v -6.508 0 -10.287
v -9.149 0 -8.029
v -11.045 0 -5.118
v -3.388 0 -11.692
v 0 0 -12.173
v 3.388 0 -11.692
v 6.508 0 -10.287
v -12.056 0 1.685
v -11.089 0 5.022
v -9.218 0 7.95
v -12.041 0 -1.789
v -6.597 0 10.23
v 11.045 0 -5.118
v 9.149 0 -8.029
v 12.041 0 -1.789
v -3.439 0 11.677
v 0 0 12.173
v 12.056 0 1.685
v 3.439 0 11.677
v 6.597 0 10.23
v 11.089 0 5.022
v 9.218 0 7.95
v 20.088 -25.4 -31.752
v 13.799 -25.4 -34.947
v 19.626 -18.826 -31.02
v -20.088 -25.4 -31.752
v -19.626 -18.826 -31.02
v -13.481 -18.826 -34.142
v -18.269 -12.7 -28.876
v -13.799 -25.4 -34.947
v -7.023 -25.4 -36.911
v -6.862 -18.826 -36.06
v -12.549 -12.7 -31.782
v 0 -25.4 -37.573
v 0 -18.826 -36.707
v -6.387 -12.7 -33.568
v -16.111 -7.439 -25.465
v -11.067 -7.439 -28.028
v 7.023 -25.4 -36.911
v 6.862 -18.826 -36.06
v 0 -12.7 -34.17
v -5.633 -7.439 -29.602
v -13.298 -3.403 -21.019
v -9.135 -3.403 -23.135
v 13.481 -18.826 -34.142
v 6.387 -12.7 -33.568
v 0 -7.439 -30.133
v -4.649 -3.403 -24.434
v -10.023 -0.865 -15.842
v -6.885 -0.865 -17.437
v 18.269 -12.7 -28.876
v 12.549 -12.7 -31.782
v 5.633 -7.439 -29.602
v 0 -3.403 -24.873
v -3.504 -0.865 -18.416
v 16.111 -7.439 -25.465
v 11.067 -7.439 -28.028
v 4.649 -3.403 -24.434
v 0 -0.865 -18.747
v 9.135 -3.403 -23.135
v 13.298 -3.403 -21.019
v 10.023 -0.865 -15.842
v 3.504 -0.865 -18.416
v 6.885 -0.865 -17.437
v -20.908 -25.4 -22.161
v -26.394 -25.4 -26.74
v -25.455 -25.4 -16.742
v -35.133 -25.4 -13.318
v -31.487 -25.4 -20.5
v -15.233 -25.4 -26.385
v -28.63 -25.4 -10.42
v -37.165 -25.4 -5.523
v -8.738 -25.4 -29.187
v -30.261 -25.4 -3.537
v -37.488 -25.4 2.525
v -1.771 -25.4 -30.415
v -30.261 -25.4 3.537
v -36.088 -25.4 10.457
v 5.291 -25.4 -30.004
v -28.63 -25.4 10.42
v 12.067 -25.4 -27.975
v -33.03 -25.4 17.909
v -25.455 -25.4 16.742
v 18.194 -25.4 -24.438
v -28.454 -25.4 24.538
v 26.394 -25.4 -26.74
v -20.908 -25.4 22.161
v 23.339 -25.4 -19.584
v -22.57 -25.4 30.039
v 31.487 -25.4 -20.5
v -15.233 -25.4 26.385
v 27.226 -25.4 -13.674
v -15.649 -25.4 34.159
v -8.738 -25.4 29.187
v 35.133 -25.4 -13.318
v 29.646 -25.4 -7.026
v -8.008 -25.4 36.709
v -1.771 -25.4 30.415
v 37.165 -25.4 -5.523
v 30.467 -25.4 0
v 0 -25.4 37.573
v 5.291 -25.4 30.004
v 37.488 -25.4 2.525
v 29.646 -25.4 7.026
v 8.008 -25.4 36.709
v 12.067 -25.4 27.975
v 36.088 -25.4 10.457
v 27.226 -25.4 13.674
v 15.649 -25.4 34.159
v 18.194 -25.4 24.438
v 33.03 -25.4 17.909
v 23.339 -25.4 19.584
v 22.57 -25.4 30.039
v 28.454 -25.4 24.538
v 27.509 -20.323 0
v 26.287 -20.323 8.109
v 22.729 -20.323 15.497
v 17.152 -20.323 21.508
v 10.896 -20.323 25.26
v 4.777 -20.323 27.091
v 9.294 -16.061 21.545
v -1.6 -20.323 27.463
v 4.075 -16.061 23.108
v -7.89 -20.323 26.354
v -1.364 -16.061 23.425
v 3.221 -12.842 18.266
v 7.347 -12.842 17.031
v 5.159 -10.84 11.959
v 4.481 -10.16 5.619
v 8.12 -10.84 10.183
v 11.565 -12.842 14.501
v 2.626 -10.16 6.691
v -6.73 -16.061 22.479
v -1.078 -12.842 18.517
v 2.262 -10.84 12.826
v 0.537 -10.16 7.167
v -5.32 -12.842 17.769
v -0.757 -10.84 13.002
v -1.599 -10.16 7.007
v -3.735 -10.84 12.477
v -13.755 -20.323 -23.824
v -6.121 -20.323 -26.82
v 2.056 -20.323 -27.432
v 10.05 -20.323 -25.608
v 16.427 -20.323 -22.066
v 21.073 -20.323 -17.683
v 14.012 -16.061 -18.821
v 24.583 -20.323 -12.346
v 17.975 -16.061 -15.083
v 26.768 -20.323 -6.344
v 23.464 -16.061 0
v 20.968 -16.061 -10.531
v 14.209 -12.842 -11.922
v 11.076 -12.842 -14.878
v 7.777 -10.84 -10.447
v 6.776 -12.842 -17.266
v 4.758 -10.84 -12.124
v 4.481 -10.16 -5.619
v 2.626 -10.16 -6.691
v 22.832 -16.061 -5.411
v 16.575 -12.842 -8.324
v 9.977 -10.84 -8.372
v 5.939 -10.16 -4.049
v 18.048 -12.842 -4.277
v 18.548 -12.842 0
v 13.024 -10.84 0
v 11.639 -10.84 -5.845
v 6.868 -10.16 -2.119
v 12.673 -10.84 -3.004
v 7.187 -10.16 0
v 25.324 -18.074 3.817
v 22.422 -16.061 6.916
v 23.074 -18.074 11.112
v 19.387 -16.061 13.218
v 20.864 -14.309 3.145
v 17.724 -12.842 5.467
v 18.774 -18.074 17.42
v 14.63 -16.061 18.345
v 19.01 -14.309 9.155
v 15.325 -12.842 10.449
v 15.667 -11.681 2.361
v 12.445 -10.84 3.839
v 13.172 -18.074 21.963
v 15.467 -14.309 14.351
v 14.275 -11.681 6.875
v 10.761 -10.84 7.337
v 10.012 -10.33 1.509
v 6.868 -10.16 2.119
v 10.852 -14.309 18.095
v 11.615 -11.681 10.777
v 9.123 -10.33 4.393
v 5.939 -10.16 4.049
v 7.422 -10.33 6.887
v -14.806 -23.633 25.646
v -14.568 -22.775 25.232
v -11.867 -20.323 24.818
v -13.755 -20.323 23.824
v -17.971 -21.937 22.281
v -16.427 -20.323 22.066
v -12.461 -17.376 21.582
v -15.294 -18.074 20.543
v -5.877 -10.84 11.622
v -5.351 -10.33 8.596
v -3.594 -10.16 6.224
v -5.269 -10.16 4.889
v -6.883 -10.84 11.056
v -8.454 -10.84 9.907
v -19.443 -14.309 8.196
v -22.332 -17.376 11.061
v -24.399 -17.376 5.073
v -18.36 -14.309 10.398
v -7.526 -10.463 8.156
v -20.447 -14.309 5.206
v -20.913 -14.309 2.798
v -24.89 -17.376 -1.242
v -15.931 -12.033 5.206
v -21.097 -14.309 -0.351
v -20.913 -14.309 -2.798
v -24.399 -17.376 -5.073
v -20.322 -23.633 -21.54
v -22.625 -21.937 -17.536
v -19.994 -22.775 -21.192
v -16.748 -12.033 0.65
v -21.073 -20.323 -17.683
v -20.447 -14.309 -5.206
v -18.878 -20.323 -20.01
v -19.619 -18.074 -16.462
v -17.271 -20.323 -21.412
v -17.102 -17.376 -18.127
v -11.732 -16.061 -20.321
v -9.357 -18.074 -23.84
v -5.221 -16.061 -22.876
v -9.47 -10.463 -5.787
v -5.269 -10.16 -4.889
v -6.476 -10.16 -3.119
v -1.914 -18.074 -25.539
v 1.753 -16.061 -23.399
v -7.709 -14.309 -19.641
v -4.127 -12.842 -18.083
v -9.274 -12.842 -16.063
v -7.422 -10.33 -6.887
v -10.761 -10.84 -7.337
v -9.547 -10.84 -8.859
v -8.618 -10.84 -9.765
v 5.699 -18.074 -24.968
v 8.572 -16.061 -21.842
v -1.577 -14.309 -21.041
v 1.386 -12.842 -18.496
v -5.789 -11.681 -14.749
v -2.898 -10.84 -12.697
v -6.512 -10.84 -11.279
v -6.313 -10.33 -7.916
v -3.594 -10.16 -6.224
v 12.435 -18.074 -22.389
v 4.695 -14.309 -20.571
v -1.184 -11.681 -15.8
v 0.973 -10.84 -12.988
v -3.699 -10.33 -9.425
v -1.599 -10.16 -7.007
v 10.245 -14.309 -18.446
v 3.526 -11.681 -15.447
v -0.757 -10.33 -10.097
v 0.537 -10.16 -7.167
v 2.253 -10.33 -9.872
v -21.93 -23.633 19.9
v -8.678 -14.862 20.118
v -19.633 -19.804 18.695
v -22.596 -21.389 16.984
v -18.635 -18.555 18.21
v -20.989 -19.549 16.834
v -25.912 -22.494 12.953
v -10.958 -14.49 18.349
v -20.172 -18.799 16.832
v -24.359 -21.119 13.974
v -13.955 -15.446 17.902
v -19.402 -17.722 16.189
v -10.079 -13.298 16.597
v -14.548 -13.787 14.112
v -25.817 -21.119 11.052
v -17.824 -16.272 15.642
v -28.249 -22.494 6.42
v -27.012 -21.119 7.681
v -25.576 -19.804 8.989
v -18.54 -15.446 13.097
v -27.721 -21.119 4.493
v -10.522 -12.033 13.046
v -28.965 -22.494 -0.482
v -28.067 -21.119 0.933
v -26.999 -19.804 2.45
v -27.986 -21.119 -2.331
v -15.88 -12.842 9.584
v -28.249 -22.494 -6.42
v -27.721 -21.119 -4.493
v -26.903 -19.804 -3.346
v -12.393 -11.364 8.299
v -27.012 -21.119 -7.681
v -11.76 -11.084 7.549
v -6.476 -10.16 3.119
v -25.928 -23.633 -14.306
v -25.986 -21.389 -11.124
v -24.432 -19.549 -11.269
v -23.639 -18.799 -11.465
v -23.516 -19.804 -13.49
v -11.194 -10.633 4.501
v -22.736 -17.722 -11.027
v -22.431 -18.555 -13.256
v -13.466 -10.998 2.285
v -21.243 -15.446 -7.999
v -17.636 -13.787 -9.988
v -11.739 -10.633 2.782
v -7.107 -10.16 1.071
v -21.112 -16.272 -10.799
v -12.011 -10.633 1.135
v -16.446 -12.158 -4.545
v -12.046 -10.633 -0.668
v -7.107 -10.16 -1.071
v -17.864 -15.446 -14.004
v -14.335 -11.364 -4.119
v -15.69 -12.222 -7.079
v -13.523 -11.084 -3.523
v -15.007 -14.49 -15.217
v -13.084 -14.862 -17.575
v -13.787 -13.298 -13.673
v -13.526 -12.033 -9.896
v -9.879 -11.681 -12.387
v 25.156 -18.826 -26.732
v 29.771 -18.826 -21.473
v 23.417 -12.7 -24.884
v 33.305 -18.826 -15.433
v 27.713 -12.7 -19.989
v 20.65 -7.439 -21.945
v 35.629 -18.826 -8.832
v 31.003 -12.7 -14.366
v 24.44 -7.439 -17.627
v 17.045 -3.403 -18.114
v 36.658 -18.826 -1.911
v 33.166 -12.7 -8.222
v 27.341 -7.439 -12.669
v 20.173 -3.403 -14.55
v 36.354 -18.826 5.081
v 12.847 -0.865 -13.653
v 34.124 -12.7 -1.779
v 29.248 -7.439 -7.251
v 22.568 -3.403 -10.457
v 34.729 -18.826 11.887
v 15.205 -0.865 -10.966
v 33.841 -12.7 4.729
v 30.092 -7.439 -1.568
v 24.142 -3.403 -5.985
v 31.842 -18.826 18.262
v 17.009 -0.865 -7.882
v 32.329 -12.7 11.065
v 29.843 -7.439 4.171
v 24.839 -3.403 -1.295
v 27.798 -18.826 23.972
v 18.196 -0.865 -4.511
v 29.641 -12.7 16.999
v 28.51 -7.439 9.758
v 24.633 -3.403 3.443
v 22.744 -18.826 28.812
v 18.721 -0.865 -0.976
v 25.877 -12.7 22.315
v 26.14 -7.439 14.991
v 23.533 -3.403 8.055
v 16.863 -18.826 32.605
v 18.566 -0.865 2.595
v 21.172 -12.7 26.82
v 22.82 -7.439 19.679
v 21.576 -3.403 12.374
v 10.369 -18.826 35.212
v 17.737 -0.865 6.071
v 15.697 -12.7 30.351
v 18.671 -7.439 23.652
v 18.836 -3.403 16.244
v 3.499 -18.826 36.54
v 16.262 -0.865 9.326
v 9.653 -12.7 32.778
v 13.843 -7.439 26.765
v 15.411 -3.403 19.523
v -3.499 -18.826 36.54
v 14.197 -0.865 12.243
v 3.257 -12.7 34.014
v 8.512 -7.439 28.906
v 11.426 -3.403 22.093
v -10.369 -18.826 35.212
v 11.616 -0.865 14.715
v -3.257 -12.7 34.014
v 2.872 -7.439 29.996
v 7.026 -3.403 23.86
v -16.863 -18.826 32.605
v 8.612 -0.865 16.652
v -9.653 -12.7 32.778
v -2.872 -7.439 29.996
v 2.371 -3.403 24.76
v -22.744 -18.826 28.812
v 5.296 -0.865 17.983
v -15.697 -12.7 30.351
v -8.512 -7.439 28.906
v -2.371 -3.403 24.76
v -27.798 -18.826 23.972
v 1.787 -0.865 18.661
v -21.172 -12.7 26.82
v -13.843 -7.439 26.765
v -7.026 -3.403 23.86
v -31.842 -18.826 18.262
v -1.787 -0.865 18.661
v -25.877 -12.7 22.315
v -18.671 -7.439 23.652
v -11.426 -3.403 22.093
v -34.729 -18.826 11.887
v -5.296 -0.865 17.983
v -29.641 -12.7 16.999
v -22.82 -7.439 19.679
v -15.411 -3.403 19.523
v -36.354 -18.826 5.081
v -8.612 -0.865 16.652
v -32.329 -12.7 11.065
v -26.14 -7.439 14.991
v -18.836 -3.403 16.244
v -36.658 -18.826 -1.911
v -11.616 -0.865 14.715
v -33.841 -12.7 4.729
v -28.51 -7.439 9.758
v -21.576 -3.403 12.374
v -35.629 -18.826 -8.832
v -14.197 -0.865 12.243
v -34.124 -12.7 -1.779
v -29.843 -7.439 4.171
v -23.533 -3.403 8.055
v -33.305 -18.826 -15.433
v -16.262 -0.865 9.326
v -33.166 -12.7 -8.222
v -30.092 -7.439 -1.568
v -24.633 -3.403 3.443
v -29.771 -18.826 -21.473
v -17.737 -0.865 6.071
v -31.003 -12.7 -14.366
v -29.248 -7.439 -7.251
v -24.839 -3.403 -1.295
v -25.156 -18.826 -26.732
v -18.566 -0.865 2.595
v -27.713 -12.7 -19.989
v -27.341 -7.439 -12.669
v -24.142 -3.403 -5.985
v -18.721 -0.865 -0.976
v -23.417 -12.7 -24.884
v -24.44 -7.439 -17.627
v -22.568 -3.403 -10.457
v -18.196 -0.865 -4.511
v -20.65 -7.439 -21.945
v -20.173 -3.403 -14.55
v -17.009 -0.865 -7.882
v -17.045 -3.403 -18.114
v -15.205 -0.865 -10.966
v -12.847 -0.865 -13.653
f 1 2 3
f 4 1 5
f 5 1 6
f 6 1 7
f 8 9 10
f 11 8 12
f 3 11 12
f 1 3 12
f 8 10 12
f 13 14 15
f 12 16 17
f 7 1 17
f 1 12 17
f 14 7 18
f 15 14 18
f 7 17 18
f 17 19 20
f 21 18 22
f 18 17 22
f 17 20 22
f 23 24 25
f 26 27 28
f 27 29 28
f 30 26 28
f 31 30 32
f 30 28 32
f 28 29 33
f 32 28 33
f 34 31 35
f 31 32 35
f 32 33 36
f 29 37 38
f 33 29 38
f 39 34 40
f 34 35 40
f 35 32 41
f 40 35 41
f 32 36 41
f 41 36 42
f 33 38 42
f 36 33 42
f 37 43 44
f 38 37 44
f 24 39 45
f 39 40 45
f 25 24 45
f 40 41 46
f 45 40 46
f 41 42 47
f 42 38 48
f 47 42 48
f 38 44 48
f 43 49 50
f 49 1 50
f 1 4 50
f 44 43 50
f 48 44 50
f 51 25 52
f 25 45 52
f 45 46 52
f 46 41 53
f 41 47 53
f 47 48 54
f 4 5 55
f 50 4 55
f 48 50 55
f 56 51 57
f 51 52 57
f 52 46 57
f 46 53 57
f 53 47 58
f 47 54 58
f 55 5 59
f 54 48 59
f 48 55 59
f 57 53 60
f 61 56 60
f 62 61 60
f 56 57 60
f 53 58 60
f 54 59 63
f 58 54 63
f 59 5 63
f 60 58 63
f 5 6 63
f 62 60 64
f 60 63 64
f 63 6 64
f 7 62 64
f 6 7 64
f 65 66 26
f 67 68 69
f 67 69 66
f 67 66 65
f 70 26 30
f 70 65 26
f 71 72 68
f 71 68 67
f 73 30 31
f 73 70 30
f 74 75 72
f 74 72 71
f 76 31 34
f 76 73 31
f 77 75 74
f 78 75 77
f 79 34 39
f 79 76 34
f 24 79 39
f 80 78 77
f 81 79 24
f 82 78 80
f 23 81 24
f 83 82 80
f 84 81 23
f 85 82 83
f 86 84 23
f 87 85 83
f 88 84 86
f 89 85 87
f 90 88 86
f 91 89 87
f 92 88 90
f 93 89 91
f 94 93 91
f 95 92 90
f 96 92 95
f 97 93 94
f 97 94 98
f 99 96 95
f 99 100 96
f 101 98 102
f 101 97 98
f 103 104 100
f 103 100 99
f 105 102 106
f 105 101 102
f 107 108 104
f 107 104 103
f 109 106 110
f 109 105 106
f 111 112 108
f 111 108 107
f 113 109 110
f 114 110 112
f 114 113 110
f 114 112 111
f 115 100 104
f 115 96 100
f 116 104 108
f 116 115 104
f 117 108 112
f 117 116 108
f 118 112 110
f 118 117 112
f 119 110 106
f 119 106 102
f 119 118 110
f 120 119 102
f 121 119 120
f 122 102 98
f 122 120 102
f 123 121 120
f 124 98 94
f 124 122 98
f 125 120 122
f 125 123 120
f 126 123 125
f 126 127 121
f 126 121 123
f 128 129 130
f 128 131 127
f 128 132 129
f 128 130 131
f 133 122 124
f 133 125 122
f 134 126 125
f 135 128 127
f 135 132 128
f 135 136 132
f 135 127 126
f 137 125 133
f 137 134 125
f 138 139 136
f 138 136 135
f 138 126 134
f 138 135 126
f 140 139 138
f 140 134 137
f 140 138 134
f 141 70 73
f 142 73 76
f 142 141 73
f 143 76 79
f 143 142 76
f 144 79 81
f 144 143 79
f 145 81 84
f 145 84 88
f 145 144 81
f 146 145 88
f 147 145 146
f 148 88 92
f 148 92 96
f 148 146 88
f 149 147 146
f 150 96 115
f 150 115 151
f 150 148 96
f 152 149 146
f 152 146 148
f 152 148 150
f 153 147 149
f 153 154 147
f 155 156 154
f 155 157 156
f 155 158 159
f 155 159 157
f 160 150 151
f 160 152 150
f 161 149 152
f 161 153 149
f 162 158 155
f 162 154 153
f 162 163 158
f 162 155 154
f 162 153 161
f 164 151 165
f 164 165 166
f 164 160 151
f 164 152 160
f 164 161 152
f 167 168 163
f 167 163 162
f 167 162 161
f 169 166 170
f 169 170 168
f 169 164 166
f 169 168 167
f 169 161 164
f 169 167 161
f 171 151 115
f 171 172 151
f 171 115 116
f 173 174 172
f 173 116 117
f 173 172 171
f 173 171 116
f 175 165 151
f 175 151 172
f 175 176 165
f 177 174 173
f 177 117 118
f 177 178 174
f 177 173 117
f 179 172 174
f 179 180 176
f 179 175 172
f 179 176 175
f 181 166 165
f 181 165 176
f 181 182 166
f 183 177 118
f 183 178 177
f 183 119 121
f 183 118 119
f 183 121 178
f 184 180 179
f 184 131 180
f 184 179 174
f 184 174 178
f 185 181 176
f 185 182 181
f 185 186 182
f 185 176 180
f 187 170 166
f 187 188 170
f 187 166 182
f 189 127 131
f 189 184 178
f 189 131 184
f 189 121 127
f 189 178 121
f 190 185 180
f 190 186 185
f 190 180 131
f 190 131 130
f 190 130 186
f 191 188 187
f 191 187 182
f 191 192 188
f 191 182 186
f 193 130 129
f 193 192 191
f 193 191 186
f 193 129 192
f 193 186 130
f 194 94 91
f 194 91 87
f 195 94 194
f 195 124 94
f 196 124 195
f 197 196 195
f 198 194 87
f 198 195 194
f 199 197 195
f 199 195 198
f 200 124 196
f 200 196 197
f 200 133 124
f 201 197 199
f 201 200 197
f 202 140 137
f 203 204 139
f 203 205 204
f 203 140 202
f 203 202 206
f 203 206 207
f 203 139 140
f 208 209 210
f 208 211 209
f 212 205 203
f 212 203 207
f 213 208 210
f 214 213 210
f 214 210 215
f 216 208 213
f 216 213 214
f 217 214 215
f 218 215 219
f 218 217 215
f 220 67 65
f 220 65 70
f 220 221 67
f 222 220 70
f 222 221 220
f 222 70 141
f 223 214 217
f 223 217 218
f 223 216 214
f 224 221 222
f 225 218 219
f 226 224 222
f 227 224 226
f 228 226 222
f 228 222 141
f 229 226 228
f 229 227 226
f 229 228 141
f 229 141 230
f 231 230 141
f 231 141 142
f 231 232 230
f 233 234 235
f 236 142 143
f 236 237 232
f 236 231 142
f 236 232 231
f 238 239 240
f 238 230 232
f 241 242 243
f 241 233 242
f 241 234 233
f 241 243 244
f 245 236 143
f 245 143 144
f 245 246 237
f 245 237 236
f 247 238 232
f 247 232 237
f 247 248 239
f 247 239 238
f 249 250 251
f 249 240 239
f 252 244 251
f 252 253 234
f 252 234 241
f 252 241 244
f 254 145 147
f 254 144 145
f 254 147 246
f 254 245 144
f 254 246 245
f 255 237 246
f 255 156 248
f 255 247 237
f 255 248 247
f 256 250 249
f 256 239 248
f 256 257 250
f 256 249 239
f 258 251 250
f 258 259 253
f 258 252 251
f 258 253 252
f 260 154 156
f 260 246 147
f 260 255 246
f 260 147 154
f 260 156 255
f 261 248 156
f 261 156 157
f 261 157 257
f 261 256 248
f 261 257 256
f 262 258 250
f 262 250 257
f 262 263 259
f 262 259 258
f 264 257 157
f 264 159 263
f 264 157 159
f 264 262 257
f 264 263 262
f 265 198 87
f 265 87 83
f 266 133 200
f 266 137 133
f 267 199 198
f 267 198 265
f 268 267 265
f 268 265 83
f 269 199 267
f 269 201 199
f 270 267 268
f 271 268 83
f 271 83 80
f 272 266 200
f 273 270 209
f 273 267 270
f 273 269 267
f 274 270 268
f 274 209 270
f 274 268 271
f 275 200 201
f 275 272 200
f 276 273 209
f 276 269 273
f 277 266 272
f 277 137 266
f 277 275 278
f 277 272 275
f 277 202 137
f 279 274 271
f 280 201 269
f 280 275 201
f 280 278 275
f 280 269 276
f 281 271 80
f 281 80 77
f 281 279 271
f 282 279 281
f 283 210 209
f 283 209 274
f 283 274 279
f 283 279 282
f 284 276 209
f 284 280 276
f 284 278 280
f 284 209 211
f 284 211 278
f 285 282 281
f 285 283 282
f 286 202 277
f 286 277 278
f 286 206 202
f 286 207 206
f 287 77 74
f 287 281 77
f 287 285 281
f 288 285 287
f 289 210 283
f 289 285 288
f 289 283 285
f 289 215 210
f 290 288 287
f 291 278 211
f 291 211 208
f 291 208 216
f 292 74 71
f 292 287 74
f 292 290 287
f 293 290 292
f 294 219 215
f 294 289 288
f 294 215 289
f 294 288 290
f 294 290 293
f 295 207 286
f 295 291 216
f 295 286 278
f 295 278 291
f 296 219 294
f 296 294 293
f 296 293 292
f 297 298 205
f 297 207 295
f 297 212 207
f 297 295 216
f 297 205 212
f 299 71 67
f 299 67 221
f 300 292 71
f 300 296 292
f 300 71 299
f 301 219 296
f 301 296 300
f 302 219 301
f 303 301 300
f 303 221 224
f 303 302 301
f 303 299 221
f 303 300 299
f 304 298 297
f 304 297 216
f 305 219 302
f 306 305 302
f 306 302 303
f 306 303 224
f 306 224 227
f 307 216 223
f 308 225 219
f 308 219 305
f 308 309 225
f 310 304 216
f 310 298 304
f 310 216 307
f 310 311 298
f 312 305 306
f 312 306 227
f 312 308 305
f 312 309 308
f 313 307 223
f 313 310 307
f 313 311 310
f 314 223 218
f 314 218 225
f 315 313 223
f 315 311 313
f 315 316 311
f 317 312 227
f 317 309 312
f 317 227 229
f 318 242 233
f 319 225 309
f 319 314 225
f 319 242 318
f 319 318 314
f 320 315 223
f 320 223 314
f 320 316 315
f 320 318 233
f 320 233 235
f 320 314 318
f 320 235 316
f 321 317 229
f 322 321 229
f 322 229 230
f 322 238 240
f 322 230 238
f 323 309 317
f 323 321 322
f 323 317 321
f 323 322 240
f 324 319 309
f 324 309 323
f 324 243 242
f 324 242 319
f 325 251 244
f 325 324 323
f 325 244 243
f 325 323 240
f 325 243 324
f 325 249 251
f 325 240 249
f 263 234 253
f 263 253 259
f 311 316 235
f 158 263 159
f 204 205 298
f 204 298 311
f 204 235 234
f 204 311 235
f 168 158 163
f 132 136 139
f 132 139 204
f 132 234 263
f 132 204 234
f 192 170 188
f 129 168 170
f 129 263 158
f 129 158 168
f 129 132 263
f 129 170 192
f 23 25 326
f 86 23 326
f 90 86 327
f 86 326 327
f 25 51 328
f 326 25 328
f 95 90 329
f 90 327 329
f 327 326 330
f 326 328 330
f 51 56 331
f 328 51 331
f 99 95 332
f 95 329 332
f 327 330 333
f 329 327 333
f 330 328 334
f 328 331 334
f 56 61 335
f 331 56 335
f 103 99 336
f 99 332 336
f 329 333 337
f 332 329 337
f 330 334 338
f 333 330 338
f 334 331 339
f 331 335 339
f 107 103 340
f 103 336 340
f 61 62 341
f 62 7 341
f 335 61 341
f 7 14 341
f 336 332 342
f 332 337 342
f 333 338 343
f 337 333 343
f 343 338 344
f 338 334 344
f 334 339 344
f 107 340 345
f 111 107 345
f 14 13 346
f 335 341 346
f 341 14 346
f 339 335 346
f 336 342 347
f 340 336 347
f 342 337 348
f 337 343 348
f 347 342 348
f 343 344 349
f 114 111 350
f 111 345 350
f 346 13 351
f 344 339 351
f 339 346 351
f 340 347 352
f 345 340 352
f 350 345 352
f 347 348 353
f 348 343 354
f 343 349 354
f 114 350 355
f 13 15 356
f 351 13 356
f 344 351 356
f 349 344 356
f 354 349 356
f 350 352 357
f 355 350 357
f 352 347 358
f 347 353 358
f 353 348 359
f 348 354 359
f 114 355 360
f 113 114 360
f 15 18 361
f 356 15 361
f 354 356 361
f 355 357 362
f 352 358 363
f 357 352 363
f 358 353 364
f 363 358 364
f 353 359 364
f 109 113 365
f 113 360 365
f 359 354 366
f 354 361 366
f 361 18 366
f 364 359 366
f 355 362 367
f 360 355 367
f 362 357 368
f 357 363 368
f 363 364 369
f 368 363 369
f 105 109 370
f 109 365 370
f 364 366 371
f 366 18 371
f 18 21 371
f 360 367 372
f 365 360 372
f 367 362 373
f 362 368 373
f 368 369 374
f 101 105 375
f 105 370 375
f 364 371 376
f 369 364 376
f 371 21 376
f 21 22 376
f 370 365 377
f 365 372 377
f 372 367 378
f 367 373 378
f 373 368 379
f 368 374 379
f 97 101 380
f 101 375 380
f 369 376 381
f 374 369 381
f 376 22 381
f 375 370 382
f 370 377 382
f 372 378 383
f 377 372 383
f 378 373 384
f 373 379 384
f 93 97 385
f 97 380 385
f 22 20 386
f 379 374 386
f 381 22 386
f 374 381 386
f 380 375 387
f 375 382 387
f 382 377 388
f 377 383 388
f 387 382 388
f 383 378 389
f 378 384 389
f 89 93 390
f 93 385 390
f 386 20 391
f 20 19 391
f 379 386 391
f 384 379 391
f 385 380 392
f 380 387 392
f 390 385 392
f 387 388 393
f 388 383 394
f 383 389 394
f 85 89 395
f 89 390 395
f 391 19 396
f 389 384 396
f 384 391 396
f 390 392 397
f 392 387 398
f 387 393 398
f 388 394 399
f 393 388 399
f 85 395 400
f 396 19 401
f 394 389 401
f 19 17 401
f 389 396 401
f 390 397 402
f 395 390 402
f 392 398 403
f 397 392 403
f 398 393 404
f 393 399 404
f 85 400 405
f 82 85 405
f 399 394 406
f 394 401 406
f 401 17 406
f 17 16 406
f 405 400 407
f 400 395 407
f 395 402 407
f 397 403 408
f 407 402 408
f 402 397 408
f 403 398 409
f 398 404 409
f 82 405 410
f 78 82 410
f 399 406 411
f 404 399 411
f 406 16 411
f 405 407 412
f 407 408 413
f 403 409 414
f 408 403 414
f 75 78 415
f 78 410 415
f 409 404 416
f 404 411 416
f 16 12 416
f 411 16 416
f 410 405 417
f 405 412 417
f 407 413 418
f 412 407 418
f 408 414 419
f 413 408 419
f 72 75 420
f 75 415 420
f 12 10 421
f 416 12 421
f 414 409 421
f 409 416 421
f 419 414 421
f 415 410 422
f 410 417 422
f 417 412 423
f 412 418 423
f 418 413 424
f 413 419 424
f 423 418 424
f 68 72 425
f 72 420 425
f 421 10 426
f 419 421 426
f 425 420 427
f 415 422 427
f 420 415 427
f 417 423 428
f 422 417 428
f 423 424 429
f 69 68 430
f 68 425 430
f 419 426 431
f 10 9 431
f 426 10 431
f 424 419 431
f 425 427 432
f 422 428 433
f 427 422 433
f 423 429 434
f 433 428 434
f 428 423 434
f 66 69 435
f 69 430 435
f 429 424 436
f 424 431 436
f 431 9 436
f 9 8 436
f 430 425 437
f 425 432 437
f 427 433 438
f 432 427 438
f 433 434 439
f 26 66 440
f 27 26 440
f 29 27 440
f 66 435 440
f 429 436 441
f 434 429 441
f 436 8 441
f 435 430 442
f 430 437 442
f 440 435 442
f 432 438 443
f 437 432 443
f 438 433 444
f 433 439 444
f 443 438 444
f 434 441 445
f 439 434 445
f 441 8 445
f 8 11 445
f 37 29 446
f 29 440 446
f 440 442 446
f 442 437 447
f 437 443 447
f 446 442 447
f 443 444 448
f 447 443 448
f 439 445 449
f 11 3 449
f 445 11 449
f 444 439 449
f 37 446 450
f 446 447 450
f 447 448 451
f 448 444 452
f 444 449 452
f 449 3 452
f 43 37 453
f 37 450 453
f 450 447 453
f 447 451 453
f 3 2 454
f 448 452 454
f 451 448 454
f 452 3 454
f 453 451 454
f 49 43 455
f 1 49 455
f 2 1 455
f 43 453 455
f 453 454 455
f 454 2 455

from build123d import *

# Parameters (mm, degrees)
F1_DEPTH = 25.4
F2_R     = 25.39999
F3_R     = 30.4669012051
F4_DEPTH = 15.24


# Not quite as in the source:
# - a fillet or chamfer that OpenCascade refuses, or shapes differently, is made with other operations: its cross-section is extruded or revolved along the edge and cut away or added
# - a fillet or chamfer is up to 0.001 mm smaller than in the source, because OpenCascade refuses the exact size


with BuildPart() as f1:
    # F0 (on Front) → F1 (new body)
    with BuildSketch(Plane.XZ):
        with BuildLine():
            ThreePointArc((20.0883221204, -31.7517811512), (32.9126956238, -18.1237622657), (37.5728132017, 0))
            ThreePointArc((37.5728132017, 0), (-18.1237622657, 32.9126956238), (-20.0883221204, -31.7517811512))
            ThreePointArc((-20.0883221204, -31.7517811512), (0, -37.5728132017), (20.0883221204, -31.7517811512))
        make_face()
    extrude(amount=F1_DEPTH)

    # F2 (radius 25.4 in the source; OpenCascade refuses exactly that, so slightly less here)
    f2_edges = [f1.edges().sort_by_distance(p)[0] for p in [
        (20.088322, 0, 31.751781),
    ]]
    fillet(f2_edges, radius=F2_R)

    # F3 (on face) → F4 (cut)
    with BuildSketch(Plane.XZ.offset(25.4)):
        Circle(F3_R)
    extrude(amount=-F4_DEPTH, mode=Mode.SUBTRACT)

    # F5: fillet of radius 25.4 on 1 edges, made by hand

    # F5_s1 → F5_t2 (revolve)
    with BuildSketch(Plane.XY):
        with BuildLine():
            ThreePointArc((30.4669012051, -25.4), (21.0995696353, -14.308835326), (7.1874166747, -10.16))
            Line((7.1874166747, -10.16), (30.4669012051, -10.16))
            Line((30.4669012051, -10.16), (30.4669012051, -25.4))
        make_face()
    revolve(axis=Axis((0, -10.16, 0), (0, -1, 0)))


solid = f1.part
